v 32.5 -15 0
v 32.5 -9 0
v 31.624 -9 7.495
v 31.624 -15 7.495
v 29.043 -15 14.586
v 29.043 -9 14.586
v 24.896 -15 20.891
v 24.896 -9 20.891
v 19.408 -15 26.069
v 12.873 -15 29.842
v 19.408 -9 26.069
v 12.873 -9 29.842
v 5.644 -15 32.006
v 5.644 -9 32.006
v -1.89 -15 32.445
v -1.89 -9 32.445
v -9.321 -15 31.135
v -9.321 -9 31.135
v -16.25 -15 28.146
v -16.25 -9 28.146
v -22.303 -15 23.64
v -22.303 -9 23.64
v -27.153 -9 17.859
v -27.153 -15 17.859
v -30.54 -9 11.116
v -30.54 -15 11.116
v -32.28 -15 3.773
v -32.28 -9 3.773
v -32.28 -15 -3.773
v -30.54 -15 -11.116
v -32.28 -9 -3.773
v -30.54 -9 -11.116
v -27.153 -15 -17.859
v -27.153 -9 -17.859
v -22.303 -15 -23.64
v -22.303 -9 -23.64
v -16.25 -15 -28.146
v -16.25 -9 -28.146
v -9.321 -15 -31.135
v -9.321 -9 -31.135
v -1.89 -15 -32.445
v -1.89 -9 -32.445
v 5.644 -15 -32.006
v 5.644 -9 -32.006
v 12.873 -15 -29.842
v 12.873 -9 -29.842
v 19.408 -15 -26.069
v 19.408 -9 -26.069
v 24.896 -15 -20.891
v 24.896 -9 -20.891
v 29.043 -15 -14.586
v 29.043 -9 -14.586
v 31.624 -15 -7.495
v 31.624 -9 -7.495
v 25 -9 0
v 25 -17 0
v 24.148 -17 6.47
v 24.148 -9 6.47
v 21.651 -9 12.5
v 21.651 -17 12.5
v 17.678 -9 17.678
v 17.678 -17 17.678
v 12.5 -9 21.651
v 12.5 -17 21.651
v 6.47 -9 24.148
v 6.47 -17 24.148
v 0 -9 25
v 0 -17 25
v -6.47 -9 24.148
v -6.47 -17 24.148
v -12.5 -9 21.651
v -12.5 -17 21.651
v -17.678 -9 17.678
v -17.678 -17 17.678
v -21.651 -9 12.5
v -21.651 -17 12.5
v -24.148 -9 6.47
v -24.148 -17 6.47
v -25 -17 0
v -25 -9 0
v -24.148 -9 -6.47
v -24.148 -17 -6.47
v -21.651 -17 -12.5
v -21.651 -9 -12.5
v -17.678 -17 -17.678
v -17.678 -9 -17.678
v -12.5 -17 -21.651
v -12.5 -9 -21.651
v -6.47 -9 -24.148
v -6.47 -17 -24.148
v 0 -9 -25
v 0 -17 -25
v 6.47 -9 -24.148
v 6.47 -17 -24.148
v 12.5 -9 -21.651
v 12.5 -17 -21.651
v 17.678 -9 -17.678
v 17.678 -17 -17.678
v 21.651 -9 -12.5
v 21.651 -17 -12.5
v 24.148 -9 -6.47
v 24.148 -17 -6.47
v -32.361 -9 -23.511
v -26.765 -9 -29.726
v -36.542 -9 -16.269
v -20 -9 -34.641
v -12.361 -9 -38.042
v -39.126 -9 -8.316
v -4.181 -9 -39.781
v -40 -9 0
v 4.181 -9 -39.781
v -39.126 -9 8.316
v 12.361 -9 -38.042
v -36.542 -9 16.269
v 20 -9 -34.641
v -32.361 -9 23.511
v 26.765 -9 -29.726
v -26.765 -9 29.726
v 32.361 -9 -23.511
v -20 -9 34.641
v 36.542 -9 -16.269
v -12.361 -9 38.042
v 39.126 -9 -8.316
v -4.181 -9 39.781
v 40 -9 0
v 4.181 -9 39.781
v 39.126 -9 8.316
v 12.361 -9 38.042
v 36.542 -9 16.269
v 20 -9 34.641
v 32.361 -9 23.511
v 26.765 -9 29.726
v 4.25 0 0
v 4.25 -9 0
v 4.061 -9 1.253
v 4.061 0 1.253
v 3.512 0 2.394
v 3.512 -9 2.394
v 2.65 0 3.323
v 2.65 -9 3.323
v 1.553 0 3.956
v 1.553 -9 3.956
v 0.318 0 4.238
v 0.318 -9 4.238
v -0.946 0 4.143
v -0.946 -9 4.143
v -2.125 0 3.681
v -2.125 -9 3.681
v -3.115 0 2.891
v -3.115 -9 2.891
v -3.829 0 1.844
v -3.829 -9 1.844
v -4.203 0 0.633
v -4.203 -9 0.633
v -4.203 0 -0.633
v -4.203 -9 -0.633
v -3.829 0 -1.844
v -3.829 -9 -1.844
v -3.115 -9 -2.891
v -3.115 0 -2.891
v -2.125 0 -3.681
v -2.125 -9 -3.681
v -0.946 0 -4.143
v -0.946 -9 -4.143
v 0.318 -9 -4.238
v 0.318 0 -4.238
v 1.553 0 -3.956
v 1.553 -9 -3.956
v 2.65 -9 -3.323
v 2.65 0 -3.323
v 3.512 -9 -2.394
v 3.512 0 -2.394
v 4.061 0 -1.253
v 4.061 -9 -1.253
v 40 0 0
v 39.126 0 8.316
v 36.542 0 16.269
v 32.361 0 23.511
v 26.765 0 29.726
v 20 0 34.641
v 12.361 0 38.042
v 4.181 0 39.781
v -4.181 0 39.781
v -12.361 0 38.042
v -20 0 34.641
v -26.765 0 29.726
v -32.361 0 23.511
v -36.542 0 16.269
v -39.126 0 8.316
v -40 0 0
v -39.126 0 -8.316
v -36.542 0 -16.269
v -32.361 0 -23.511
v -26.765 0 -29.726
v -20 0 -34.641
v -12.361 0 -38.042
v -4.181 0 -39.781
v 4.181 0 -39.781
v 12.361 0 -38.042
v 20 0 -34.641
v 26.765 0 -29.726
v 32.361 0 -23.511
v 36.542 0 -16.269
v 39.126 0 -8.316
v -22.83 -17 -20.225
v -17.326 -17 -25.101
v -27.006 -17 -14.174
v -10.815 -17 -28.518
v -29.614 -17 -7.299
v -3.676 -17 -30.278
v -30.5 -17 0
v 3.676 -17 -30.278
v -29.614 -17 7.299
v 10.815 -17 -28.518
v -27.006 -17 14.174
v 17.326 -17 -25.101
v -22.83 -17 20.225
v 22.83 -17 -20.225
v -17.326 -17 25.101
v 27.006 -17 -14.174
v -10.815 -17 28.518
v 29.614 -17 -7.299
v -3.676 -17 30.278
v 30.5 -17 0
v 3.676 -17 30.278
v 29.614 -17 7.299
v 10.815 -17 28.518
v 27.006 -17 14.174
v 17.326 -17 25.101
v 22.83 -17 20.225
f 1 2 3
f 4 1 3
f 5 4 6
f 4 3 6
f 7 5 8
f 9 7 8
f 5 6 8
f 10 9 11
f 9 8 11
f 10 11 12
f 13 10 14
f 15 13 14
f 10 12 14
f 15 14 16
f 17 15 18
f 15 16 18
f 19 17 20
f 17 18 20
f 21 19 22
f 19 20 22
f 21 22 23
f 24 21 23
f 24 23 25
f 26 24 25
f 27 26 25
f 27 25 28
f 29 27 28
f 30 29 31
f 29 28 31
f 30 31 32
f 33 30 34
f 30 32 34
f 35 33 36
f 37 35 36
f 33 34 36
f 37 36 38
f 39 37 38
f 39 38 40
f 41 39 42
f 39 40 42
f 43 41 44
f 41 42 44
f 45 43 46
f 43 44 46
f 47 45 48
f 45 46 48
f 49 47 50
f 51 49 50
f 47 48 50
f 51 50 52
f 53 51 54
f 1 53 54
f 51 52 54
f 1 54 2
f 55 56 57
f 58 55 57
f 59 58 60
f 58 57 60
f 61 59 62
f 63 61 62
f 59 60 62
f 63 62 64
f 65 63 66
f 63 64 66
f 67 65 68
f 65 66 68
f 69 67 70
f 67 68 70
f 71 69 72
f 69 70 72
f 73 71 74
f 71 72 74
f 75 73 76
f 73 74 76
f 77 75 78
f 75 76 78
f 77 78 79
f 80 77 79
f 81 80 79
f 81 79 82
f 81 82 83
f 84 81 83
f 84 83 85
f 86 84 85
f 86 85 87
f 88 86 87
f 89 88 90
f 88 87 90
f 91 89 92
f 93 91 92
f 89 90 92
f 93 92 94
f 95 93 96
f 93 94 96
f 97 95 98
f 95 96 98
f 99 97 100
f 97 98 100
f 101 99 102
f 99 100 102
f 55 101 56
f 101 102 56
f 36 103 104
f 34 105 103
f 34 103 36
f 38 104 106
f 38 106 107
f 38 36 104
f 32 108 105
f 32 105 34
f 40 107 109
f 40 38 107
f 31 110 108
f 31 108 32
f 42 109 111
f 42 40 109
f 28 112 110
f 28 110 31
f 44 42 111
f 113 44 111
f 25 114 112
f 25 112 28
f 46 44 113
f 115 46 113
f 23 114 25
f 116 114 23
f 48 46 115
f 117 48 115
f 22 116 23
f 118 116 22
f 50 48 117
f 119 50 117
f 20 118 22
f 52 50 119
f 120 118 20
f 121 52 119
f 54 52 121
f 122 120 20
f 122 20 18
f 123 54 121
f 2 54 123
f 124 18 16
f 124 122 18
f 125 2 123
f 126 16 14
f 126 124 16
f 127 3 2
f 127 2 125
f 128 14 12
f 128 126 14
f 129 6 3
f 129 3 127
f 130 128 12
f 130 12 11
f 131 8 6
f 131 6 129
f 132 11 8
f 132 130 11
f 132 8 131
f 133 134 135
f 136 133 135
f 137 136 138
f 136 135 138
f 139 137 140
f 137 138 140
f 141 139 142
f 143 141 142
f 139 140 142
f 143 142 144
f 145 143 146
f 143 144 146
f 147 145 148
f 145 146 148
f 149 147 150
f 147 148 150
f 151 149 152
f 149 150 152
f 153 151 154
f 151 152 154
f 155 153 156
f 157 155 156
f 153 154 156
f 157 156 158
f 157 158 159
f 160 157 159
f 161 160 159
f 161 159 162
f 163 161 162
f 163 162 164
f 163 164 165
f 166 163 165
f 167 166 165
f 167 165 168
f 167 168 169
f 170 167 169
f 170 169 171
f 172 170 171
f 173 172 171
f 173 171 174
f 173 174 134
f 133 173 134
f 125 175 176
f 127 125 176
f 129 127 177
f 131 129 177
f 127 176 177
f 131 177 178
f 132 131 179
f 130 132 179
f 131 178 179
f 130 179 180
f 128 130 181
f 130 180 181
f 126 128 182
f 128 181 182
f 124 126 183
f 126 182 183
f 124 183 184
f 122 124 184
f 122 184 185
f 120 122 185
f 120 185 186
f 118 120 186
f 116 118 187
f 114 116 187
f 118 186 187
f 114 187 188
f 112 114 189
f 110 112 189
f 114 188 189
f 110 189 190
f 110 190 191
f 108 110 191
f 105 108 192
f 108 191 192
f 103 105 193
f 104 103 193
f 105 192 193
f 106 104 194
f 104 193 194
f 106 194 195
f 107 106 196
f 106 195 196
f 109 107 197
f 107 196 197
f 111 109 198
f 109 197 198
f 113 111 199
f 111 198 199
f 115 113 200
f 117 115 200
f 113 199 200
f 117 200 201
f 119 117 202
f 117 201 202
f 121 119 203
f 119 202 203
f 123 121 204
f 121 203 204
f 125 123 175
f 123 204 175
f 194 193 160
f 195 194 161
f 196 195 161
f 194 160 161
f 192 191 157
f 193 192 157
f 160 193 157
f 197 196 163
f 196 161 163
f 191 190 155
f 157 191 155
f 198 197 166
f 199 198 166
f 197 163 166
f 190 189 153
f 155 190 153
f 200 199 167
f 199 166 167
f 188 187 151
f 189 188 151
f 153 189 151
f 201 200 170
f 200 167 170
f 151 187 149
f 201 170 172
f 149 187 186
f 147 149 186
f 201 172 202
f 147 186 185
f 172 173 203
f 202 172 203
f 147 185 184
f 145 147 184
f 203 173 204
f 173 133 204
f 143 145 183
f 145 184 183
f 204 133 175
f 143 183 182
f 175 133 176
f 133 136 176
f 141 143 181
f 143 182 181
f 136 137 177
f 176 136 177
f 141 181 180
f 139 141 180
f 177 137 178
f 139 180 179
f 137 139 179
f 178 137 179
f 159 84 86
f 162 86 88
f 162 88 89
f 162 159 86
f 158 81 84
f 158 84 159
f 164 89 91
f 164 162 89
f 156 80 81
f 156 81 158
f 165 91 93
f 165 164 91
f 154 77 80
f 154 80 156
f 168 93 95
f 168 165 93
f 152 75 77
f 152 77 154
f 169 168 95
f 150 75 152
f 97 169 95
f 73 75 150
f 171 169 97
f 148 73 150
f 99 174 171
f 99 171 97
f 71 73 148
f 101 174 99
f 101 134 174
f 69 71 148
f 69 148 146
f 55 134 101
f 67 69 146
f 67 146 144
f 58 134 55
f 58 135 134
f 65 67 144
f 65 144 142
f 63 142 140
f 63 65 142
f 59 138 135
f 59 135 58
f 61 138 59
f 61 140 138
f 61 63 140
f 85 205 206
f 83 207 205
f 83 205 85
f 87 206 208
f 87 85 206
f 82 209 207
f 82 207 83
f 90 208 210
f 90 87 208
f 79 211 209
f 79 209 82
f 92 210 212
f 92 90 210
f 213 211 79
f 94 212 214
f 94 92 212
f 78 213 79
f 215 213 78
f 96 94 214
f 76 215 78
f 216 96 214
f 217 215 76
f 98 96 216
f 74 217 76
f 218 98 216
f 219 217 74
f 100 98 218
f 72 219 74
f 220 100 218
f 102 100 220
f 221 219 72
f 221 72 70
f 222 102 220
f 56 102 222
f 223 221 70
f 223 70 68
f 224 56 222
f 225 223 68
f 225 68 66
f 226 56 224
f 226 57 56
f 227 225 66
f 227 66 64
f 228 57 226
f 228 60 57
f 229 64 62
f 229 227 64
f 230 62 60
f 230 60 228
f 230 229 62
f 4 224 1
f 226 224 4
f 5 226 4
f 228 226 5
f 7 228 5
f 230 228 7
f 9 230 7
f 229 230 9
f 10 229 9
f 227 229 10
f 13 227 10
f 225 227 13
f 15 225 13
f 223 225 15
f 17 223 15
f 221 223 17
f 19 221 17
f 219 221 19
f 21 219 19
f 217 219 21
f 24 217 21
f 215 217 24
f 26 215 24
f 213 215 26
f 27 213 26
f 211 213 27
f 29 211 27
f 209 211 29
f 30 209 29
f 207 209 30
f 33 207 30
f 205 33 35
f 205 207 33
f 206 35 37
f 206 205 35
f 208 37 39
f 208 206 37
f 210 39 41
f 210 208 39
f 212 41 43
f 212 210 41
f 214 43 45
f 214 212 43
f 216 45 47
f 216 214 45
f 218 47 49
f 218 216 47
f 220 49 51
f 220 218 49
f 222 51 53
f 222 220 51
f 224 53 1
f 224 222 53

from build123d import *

# Parameters (mm, degrees)
F0_R     = 40
F1_DEPTH = 9
F2_R     = 32.5
F3_DEPTH = 8
F4_R     = 25
F5_DEPTH = 8
F6_R     = 4.25
F7_DEPTH = 25
F8_SIZE  = 2


with BuildPart() as f1:
    # F0 (on Front) → F1 (new body)
    with BuildSketch(Plane.XZ):
        Circle(F0_R)
    extrude(amount=F1_DEPTH)

    # F2 (on face) → F3 (join)
    with BuildSketch(Plane.XZ.offset(9)):
        Circle(F2_R)
    extrude(amount=F3_DEPTH)

    # F4 (on face) → F5 (cut)
    with BuildSketch(Plane.XZ.offset(17)):
        Circle(F4_R)
    extrude(amount=-F5_DEPTH, mode=Mode.SUBTRACT)

    # F6 (on face) → F7 (cut)
    with BuildSketch(Plane.XZ.offset(9)):
        Circle(F6_R)
    extrude(amount=-F7_DEPTH, mode=Mode.SUBTRACT)

    # F8
    f8_edges = [f1.edges().sort_by_distance(p)[0] for p in [
        (-32.5, -17, 0),
    ]]
    chamfer(f8_edges, length=F8_SIZE)


solid = f1.part
